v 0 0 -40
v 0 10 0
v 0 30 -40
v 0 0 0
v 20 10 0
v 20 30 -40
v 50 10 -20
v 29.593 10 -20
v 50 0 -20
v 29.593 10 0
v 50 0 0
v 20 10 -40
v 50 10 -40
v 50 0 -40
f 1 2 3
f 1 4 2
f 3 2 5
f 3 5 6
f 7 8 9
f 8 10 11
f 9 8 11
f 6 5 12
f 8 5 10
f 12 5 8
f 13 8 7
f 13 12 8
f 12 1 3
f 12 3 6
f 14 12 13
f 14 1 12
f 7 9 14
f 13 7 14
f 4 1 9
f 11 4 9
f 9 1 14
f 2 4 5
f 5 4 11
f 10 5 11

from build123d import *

# Parameters (mm, degrees)
SKETCH1_W           = 50
SKETCH1_H           = 40
BOSS_EXTRUDE4_DEPTH = 10
CUT_EXTRUDE1_DEPTH  = 20
SKETCH9_W           = 20
SKETCH9_H           = 40
BOSS_EXTRUDE5_DEPTH = 20
CUT_EXTRUDE3_DEPTH  = 20


with BuildPart() as part:
    # Sketch1 → Boss-Extrude4 (new body)
    with BuildSketch(Plane(origin=(0, 0, 0), x_dir=(1, 0, 0), z_dir=(0, 1, 0))):
        with Locations((25, 20)):
            Rectangle(SKETCH1_W, SKETCH1_H)
    extrude(amount=BOSS_EXTRUDE4_DEPTH)

    # Sketch8 → Cut-Extrude1 (cut)
    with BuildSketch(Plane.XY):
        Polygon((50, 0), (50, 10), (29.592919786, 10), align=None)
    extrude(amount=-CUT_EXTRUDE1_DEPTH, mode=Mode.SUBTRACT)

    # Sketch9 → Boss-Extrude5 (add)
    with BuildSketch(Plane(origin=(0, 10, 0), x_dir=(1, 0, 0), z_dir=(0, 1, 0))):
        with Locations((10, 20)):
            Rectangle(SKETCH9_W, SKETCH9_H)
    extrude(amount=BOSS_EXTRUDE5_DEPTH)

    # Sketch10 → Cut-Extrude3 (cut)
    with BuildSketch(Plane.ZY):
        Polygon((-40, 30), (0, 30), (0, 10), align=None)
    extrude(amount=-CUT_EXTRUDE3_DEPTH, mode=Mode.SUBTRACT)


solid = part.part
